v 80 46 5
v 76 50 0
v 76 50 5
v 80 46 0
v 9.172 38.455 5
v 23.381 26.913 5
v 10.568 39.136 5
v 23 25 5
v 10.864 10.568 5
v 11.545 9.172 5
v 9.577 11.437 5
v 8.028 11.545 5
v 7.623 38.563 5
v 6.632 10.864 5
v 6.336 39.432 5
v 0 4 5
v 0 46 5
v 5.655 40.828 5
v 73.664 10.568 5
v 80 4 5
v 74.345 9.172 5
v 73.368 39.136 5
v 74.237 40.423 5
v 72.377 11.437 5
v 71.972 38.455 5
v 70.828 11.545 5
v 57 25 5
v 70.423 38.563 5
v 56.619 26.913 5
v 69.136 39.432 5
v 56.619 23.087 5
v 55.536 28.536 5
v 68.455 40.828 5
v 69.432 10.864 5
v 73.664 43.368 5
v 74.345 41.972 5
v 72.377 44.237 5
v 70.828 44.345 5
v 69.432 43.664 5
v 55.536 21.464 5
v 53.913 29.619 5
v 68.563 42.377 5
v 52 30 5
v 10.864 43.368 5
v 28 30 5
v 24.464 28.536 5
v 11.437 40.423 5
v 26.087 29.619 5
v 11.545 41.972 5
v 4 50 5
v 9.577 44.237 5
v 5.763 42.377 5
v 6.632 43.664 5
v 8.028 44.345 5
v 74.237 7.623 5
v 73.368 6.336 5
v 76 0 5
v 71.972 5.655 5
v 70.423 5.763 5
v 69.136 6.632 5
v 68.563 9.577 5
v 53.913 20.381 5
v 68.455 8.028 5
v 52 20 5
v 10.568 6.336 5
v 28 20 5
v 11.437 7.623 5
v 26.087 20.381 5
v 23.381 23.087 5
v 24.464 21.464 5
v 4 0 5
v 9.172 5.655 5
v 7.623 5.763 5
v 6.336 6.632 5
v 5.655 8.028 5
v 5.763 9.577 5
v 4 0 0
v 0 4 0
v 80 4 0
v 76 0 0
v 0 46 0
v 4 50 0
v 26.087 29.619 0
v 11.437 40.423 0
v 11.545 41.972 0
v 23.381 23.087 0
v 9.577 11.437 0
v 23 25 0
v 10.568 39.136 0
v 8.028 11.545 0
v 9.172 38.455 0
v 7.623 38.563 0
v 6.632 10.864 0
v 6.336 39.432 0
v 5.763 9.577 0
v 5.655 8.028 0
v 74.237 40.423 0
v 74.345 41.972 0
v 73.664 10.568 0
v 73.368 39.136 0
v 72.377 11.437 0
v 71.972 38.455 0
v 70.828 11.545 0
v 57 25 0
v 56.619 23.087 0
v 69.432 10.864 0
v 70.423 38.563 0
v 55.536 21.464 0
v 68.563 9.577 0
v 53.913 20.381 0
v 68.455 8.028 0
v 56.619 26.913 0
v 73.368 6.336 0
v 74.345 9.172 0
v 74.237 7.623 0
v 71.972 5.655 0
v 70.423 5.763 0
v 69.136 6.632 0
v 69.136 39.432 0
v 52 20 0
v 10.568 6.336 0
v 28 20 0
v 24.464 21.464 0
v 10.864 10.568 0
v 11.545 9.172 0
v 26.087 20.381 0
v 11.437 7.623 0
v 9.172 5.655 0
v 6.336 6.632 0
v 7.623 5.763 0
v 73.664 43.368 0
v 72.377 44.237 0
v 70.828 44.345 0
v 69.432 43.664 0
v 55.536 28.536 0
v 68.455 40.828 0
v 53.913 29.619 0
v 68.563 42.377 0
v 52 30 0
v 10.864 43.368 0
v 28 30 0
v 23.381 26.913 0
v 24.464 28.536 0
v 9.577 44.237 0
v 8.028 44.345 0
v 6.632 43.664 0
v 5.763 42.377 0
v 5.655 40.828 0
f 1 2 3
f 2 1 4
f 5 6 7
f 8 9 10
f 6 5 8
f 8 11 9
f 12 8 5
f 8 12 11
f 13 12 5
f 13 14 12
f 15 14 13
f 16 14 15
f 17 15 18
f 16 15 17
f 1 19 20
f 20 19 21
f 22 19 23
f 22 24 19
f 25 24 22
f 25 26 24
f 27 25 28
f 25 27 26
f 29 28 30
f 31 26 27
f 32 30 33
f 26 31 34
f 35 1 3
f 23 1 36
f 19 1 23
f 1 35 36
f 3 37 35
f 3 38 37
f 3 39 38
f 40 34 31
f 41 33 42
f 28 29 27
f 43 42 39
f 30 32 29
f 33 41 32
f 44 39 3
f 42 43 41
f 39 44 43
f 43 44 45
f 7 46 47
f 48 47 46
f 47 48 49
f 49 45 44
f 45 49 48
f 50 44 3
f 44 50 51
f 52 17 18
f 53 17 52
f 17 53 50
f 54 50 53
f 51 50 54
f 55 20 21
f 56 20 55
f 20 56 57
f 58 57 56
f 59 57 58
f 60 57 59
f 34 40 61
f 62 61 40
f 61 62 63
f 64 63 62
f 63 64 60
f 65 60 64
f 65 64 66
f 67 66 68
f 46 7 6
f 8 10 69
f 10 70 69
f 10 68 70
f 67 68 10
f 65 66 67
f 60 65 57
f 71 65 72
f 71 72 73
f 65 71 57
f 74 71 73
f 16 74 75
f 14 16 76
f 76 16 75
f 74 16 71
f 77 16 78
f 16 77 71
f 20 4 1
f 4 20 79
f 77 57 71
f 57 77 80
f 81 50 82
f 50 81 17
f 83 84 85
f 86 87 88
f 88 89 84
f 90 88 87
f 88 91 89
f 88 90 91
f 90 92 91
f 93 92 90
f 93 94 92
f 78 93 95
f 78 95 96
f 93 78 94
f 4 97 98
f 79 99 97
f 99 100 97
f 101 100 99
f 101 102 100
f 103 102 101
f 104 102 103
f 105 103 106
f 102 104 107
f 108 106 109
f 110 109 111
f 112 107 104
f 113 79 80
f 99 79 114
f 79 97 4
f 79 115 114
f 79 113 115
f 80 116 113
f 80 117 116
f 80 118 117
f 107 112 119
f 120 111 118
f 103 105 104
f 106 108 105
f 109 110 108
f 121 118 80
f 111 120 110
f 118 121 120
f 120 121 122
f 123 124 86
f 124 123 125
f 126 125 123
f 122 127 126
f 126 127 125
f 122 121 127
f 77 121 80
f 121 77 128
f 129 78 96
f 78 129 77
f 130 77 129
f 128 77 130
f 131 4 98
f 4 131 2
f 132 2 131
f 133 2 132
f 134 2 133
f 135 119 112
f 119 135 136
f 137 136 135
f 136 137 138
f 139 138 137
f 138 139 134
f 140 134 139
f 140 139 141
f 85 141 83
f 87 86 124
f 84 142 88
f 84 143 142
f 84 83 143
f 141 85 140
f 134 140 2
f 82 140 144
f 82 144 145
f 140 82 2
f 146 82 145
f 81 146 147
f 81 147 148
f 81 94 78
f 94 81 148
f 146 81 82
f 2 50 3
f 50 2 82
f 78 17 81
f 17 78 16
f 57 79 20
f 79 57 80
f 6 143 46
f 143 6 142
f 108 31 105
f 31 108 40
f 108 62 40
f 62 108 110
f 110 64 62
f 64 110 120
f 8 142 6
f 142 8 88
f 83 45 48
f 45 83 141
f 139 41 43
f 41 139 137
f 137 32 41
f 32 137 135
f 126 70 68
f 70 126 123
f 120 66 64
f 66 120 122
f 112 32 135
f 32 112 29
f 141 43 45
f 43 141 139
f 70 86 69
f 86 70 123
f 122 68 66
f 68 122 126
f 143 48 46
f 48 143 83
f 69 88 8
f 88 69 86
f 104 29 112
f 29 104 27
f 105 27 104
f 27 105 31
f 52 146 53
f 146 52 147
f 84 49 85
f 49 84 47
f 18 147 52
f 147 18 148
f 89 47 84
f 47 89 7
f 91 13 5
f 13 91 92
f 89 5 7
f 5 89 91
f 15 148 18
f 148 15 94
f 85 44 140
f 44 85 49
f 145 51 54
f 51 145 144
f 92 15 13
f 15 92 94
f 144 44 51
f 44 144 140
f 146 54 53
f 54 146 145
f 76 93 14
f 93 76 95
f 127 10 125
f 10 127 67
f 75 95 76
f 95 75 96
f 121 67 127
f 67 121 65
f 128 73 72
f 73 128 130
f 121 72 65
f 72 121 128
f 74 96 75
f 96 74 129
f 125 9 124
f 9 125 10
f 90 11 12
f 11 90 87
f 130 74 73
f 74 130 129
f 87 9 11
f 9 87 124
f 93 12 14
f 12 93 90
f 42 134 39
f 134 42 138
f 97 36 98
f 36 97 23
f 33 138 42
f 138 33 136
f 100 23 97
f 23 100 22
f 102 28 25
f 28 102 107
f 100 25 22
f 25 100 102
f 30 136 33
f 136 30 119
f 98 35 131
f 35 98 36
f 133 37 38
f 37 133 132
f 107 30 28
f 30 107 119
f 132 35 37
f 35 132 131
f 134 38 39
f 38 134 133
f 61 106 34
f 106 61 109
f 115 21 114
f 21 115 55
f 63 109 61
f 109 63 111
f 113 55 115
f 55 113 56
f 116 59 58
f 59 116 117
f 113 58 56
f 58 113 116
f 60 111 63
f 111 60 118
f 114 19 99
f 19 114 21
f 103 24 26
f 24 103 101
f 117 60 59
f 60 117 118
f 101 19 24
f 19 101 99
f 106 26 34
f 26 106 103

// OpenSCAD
$fn = 32;

// ----------------------------------------------------------------------
// Bracket plate: slot plate 80 x 50
// ----------------------------------------------------------------------

// --- parameters (mm) ---
hole_r = 3;               // bolt hole radius
plate_t = 5;              // plate thickness, Z (extrusion height)
plate_l = 80;             // plate length
plate_w = 50;             // plate width
slot_l = 24;              // slot straight length
slot_r = 5;               // slot end radius
fit_tol = 0.05;           // declared fit tolerance (prompt contract)
free_tol = 0.2;           // declared free tolerance (prompt contract)

slot_len = slot_l + 2 * slot_r;
slot_w = 2 * slot_r;
hole_d2 = 2 * hole_r;

profile = [[4, 0], [76, 0], [80, 4], [80, 46], [76, 50], [4, 50], [0, 46], [0, 4]];  // primary outline, 8 points, counter clockwise
void_1 = [[52, 20], [53.913, 20.381], [55.536, 21.464], [56.619, 23.087], [57, 25], [56.619, 26.913], [55.536, 28.536], [53.913, 29.619], [52, 30], [28, 30], [26.087, 29.619], [24.464, 28.536], [23.381, 26.913], [23, 25], [23.381, 23.087], [24.464, 21.464], [26.087, 20.381], [28, 20]];  // grip slot, 18 points
void_2 = [[11.545, 41.972], [10.864, 43.368], [9.577, 44.237], [8.028, 44.345], [6.632, 43.664], [5.763, 42.377], [5.655, 40.828], [6.336, 39.432], [7.623, 38.563], [9.172, 38.455], [10.568, 39.136], [11.437, 40.423]];  // corner hole, 12 points
void_3 = [[11.545, 9.172], [10.864, 10.568], [9.577, 11.437], [8.028, 11.545], [6.632, 10.864], [5.763, 9.577], [5.655, 8.028], [6.336, 6.632], [7.623, 5.763], [9.172, 5.655], [10.568, 6.336], [11.437, 7.623]];  // corner hole, 12 points
void_4 = [[74.345, 41.972], [73.664, 43.368], [72.377, 44.237], [70.828, 44.345], [69.432, 43.664], [68.563, 42.377], [68.455, 40.828], [69.136, 39.432], [70.423, 38.563], [71.972, 38.455], [73.368, 39.136], [74.237, 40.423]];  // corner hole, 12 points
void_5 = [[74.345, 9.172], [73.664, 10.568], [72.377, 11.437], [70.828, 11.545], [69.432, 10.864], [68.563, 9.577], [68.455, 8.028], [69.136, 6.632], [70.423, 5.763], [71.972, 5.655], [73.368, 6.336], [74.237, 7.623]];  // corner hole, 12 points

// --- the one profile operation ---
difference() {
  linear_extrude(height = plate_t) polygon(points = profile);
  translate([0, 0, -1])
    linear_extrude(height = plate_t + 2) polygon(points = void_1);
  translate([0, 0, -1])
    linear_extrude(height = plate_t + 2) polygon(points = void_2);
  translate([0, 0, -1])
    linear_extrude(height = plate_t + 2) polygon(points = void_3);
  translate([0, 0, -1])
    linear_extrude(height = plate_t + 2) polygon(points = void_4);
  translate([0, 0, -1])
    linear_extrude(height = plate_t + 2) polygon(points = void_5);
}
